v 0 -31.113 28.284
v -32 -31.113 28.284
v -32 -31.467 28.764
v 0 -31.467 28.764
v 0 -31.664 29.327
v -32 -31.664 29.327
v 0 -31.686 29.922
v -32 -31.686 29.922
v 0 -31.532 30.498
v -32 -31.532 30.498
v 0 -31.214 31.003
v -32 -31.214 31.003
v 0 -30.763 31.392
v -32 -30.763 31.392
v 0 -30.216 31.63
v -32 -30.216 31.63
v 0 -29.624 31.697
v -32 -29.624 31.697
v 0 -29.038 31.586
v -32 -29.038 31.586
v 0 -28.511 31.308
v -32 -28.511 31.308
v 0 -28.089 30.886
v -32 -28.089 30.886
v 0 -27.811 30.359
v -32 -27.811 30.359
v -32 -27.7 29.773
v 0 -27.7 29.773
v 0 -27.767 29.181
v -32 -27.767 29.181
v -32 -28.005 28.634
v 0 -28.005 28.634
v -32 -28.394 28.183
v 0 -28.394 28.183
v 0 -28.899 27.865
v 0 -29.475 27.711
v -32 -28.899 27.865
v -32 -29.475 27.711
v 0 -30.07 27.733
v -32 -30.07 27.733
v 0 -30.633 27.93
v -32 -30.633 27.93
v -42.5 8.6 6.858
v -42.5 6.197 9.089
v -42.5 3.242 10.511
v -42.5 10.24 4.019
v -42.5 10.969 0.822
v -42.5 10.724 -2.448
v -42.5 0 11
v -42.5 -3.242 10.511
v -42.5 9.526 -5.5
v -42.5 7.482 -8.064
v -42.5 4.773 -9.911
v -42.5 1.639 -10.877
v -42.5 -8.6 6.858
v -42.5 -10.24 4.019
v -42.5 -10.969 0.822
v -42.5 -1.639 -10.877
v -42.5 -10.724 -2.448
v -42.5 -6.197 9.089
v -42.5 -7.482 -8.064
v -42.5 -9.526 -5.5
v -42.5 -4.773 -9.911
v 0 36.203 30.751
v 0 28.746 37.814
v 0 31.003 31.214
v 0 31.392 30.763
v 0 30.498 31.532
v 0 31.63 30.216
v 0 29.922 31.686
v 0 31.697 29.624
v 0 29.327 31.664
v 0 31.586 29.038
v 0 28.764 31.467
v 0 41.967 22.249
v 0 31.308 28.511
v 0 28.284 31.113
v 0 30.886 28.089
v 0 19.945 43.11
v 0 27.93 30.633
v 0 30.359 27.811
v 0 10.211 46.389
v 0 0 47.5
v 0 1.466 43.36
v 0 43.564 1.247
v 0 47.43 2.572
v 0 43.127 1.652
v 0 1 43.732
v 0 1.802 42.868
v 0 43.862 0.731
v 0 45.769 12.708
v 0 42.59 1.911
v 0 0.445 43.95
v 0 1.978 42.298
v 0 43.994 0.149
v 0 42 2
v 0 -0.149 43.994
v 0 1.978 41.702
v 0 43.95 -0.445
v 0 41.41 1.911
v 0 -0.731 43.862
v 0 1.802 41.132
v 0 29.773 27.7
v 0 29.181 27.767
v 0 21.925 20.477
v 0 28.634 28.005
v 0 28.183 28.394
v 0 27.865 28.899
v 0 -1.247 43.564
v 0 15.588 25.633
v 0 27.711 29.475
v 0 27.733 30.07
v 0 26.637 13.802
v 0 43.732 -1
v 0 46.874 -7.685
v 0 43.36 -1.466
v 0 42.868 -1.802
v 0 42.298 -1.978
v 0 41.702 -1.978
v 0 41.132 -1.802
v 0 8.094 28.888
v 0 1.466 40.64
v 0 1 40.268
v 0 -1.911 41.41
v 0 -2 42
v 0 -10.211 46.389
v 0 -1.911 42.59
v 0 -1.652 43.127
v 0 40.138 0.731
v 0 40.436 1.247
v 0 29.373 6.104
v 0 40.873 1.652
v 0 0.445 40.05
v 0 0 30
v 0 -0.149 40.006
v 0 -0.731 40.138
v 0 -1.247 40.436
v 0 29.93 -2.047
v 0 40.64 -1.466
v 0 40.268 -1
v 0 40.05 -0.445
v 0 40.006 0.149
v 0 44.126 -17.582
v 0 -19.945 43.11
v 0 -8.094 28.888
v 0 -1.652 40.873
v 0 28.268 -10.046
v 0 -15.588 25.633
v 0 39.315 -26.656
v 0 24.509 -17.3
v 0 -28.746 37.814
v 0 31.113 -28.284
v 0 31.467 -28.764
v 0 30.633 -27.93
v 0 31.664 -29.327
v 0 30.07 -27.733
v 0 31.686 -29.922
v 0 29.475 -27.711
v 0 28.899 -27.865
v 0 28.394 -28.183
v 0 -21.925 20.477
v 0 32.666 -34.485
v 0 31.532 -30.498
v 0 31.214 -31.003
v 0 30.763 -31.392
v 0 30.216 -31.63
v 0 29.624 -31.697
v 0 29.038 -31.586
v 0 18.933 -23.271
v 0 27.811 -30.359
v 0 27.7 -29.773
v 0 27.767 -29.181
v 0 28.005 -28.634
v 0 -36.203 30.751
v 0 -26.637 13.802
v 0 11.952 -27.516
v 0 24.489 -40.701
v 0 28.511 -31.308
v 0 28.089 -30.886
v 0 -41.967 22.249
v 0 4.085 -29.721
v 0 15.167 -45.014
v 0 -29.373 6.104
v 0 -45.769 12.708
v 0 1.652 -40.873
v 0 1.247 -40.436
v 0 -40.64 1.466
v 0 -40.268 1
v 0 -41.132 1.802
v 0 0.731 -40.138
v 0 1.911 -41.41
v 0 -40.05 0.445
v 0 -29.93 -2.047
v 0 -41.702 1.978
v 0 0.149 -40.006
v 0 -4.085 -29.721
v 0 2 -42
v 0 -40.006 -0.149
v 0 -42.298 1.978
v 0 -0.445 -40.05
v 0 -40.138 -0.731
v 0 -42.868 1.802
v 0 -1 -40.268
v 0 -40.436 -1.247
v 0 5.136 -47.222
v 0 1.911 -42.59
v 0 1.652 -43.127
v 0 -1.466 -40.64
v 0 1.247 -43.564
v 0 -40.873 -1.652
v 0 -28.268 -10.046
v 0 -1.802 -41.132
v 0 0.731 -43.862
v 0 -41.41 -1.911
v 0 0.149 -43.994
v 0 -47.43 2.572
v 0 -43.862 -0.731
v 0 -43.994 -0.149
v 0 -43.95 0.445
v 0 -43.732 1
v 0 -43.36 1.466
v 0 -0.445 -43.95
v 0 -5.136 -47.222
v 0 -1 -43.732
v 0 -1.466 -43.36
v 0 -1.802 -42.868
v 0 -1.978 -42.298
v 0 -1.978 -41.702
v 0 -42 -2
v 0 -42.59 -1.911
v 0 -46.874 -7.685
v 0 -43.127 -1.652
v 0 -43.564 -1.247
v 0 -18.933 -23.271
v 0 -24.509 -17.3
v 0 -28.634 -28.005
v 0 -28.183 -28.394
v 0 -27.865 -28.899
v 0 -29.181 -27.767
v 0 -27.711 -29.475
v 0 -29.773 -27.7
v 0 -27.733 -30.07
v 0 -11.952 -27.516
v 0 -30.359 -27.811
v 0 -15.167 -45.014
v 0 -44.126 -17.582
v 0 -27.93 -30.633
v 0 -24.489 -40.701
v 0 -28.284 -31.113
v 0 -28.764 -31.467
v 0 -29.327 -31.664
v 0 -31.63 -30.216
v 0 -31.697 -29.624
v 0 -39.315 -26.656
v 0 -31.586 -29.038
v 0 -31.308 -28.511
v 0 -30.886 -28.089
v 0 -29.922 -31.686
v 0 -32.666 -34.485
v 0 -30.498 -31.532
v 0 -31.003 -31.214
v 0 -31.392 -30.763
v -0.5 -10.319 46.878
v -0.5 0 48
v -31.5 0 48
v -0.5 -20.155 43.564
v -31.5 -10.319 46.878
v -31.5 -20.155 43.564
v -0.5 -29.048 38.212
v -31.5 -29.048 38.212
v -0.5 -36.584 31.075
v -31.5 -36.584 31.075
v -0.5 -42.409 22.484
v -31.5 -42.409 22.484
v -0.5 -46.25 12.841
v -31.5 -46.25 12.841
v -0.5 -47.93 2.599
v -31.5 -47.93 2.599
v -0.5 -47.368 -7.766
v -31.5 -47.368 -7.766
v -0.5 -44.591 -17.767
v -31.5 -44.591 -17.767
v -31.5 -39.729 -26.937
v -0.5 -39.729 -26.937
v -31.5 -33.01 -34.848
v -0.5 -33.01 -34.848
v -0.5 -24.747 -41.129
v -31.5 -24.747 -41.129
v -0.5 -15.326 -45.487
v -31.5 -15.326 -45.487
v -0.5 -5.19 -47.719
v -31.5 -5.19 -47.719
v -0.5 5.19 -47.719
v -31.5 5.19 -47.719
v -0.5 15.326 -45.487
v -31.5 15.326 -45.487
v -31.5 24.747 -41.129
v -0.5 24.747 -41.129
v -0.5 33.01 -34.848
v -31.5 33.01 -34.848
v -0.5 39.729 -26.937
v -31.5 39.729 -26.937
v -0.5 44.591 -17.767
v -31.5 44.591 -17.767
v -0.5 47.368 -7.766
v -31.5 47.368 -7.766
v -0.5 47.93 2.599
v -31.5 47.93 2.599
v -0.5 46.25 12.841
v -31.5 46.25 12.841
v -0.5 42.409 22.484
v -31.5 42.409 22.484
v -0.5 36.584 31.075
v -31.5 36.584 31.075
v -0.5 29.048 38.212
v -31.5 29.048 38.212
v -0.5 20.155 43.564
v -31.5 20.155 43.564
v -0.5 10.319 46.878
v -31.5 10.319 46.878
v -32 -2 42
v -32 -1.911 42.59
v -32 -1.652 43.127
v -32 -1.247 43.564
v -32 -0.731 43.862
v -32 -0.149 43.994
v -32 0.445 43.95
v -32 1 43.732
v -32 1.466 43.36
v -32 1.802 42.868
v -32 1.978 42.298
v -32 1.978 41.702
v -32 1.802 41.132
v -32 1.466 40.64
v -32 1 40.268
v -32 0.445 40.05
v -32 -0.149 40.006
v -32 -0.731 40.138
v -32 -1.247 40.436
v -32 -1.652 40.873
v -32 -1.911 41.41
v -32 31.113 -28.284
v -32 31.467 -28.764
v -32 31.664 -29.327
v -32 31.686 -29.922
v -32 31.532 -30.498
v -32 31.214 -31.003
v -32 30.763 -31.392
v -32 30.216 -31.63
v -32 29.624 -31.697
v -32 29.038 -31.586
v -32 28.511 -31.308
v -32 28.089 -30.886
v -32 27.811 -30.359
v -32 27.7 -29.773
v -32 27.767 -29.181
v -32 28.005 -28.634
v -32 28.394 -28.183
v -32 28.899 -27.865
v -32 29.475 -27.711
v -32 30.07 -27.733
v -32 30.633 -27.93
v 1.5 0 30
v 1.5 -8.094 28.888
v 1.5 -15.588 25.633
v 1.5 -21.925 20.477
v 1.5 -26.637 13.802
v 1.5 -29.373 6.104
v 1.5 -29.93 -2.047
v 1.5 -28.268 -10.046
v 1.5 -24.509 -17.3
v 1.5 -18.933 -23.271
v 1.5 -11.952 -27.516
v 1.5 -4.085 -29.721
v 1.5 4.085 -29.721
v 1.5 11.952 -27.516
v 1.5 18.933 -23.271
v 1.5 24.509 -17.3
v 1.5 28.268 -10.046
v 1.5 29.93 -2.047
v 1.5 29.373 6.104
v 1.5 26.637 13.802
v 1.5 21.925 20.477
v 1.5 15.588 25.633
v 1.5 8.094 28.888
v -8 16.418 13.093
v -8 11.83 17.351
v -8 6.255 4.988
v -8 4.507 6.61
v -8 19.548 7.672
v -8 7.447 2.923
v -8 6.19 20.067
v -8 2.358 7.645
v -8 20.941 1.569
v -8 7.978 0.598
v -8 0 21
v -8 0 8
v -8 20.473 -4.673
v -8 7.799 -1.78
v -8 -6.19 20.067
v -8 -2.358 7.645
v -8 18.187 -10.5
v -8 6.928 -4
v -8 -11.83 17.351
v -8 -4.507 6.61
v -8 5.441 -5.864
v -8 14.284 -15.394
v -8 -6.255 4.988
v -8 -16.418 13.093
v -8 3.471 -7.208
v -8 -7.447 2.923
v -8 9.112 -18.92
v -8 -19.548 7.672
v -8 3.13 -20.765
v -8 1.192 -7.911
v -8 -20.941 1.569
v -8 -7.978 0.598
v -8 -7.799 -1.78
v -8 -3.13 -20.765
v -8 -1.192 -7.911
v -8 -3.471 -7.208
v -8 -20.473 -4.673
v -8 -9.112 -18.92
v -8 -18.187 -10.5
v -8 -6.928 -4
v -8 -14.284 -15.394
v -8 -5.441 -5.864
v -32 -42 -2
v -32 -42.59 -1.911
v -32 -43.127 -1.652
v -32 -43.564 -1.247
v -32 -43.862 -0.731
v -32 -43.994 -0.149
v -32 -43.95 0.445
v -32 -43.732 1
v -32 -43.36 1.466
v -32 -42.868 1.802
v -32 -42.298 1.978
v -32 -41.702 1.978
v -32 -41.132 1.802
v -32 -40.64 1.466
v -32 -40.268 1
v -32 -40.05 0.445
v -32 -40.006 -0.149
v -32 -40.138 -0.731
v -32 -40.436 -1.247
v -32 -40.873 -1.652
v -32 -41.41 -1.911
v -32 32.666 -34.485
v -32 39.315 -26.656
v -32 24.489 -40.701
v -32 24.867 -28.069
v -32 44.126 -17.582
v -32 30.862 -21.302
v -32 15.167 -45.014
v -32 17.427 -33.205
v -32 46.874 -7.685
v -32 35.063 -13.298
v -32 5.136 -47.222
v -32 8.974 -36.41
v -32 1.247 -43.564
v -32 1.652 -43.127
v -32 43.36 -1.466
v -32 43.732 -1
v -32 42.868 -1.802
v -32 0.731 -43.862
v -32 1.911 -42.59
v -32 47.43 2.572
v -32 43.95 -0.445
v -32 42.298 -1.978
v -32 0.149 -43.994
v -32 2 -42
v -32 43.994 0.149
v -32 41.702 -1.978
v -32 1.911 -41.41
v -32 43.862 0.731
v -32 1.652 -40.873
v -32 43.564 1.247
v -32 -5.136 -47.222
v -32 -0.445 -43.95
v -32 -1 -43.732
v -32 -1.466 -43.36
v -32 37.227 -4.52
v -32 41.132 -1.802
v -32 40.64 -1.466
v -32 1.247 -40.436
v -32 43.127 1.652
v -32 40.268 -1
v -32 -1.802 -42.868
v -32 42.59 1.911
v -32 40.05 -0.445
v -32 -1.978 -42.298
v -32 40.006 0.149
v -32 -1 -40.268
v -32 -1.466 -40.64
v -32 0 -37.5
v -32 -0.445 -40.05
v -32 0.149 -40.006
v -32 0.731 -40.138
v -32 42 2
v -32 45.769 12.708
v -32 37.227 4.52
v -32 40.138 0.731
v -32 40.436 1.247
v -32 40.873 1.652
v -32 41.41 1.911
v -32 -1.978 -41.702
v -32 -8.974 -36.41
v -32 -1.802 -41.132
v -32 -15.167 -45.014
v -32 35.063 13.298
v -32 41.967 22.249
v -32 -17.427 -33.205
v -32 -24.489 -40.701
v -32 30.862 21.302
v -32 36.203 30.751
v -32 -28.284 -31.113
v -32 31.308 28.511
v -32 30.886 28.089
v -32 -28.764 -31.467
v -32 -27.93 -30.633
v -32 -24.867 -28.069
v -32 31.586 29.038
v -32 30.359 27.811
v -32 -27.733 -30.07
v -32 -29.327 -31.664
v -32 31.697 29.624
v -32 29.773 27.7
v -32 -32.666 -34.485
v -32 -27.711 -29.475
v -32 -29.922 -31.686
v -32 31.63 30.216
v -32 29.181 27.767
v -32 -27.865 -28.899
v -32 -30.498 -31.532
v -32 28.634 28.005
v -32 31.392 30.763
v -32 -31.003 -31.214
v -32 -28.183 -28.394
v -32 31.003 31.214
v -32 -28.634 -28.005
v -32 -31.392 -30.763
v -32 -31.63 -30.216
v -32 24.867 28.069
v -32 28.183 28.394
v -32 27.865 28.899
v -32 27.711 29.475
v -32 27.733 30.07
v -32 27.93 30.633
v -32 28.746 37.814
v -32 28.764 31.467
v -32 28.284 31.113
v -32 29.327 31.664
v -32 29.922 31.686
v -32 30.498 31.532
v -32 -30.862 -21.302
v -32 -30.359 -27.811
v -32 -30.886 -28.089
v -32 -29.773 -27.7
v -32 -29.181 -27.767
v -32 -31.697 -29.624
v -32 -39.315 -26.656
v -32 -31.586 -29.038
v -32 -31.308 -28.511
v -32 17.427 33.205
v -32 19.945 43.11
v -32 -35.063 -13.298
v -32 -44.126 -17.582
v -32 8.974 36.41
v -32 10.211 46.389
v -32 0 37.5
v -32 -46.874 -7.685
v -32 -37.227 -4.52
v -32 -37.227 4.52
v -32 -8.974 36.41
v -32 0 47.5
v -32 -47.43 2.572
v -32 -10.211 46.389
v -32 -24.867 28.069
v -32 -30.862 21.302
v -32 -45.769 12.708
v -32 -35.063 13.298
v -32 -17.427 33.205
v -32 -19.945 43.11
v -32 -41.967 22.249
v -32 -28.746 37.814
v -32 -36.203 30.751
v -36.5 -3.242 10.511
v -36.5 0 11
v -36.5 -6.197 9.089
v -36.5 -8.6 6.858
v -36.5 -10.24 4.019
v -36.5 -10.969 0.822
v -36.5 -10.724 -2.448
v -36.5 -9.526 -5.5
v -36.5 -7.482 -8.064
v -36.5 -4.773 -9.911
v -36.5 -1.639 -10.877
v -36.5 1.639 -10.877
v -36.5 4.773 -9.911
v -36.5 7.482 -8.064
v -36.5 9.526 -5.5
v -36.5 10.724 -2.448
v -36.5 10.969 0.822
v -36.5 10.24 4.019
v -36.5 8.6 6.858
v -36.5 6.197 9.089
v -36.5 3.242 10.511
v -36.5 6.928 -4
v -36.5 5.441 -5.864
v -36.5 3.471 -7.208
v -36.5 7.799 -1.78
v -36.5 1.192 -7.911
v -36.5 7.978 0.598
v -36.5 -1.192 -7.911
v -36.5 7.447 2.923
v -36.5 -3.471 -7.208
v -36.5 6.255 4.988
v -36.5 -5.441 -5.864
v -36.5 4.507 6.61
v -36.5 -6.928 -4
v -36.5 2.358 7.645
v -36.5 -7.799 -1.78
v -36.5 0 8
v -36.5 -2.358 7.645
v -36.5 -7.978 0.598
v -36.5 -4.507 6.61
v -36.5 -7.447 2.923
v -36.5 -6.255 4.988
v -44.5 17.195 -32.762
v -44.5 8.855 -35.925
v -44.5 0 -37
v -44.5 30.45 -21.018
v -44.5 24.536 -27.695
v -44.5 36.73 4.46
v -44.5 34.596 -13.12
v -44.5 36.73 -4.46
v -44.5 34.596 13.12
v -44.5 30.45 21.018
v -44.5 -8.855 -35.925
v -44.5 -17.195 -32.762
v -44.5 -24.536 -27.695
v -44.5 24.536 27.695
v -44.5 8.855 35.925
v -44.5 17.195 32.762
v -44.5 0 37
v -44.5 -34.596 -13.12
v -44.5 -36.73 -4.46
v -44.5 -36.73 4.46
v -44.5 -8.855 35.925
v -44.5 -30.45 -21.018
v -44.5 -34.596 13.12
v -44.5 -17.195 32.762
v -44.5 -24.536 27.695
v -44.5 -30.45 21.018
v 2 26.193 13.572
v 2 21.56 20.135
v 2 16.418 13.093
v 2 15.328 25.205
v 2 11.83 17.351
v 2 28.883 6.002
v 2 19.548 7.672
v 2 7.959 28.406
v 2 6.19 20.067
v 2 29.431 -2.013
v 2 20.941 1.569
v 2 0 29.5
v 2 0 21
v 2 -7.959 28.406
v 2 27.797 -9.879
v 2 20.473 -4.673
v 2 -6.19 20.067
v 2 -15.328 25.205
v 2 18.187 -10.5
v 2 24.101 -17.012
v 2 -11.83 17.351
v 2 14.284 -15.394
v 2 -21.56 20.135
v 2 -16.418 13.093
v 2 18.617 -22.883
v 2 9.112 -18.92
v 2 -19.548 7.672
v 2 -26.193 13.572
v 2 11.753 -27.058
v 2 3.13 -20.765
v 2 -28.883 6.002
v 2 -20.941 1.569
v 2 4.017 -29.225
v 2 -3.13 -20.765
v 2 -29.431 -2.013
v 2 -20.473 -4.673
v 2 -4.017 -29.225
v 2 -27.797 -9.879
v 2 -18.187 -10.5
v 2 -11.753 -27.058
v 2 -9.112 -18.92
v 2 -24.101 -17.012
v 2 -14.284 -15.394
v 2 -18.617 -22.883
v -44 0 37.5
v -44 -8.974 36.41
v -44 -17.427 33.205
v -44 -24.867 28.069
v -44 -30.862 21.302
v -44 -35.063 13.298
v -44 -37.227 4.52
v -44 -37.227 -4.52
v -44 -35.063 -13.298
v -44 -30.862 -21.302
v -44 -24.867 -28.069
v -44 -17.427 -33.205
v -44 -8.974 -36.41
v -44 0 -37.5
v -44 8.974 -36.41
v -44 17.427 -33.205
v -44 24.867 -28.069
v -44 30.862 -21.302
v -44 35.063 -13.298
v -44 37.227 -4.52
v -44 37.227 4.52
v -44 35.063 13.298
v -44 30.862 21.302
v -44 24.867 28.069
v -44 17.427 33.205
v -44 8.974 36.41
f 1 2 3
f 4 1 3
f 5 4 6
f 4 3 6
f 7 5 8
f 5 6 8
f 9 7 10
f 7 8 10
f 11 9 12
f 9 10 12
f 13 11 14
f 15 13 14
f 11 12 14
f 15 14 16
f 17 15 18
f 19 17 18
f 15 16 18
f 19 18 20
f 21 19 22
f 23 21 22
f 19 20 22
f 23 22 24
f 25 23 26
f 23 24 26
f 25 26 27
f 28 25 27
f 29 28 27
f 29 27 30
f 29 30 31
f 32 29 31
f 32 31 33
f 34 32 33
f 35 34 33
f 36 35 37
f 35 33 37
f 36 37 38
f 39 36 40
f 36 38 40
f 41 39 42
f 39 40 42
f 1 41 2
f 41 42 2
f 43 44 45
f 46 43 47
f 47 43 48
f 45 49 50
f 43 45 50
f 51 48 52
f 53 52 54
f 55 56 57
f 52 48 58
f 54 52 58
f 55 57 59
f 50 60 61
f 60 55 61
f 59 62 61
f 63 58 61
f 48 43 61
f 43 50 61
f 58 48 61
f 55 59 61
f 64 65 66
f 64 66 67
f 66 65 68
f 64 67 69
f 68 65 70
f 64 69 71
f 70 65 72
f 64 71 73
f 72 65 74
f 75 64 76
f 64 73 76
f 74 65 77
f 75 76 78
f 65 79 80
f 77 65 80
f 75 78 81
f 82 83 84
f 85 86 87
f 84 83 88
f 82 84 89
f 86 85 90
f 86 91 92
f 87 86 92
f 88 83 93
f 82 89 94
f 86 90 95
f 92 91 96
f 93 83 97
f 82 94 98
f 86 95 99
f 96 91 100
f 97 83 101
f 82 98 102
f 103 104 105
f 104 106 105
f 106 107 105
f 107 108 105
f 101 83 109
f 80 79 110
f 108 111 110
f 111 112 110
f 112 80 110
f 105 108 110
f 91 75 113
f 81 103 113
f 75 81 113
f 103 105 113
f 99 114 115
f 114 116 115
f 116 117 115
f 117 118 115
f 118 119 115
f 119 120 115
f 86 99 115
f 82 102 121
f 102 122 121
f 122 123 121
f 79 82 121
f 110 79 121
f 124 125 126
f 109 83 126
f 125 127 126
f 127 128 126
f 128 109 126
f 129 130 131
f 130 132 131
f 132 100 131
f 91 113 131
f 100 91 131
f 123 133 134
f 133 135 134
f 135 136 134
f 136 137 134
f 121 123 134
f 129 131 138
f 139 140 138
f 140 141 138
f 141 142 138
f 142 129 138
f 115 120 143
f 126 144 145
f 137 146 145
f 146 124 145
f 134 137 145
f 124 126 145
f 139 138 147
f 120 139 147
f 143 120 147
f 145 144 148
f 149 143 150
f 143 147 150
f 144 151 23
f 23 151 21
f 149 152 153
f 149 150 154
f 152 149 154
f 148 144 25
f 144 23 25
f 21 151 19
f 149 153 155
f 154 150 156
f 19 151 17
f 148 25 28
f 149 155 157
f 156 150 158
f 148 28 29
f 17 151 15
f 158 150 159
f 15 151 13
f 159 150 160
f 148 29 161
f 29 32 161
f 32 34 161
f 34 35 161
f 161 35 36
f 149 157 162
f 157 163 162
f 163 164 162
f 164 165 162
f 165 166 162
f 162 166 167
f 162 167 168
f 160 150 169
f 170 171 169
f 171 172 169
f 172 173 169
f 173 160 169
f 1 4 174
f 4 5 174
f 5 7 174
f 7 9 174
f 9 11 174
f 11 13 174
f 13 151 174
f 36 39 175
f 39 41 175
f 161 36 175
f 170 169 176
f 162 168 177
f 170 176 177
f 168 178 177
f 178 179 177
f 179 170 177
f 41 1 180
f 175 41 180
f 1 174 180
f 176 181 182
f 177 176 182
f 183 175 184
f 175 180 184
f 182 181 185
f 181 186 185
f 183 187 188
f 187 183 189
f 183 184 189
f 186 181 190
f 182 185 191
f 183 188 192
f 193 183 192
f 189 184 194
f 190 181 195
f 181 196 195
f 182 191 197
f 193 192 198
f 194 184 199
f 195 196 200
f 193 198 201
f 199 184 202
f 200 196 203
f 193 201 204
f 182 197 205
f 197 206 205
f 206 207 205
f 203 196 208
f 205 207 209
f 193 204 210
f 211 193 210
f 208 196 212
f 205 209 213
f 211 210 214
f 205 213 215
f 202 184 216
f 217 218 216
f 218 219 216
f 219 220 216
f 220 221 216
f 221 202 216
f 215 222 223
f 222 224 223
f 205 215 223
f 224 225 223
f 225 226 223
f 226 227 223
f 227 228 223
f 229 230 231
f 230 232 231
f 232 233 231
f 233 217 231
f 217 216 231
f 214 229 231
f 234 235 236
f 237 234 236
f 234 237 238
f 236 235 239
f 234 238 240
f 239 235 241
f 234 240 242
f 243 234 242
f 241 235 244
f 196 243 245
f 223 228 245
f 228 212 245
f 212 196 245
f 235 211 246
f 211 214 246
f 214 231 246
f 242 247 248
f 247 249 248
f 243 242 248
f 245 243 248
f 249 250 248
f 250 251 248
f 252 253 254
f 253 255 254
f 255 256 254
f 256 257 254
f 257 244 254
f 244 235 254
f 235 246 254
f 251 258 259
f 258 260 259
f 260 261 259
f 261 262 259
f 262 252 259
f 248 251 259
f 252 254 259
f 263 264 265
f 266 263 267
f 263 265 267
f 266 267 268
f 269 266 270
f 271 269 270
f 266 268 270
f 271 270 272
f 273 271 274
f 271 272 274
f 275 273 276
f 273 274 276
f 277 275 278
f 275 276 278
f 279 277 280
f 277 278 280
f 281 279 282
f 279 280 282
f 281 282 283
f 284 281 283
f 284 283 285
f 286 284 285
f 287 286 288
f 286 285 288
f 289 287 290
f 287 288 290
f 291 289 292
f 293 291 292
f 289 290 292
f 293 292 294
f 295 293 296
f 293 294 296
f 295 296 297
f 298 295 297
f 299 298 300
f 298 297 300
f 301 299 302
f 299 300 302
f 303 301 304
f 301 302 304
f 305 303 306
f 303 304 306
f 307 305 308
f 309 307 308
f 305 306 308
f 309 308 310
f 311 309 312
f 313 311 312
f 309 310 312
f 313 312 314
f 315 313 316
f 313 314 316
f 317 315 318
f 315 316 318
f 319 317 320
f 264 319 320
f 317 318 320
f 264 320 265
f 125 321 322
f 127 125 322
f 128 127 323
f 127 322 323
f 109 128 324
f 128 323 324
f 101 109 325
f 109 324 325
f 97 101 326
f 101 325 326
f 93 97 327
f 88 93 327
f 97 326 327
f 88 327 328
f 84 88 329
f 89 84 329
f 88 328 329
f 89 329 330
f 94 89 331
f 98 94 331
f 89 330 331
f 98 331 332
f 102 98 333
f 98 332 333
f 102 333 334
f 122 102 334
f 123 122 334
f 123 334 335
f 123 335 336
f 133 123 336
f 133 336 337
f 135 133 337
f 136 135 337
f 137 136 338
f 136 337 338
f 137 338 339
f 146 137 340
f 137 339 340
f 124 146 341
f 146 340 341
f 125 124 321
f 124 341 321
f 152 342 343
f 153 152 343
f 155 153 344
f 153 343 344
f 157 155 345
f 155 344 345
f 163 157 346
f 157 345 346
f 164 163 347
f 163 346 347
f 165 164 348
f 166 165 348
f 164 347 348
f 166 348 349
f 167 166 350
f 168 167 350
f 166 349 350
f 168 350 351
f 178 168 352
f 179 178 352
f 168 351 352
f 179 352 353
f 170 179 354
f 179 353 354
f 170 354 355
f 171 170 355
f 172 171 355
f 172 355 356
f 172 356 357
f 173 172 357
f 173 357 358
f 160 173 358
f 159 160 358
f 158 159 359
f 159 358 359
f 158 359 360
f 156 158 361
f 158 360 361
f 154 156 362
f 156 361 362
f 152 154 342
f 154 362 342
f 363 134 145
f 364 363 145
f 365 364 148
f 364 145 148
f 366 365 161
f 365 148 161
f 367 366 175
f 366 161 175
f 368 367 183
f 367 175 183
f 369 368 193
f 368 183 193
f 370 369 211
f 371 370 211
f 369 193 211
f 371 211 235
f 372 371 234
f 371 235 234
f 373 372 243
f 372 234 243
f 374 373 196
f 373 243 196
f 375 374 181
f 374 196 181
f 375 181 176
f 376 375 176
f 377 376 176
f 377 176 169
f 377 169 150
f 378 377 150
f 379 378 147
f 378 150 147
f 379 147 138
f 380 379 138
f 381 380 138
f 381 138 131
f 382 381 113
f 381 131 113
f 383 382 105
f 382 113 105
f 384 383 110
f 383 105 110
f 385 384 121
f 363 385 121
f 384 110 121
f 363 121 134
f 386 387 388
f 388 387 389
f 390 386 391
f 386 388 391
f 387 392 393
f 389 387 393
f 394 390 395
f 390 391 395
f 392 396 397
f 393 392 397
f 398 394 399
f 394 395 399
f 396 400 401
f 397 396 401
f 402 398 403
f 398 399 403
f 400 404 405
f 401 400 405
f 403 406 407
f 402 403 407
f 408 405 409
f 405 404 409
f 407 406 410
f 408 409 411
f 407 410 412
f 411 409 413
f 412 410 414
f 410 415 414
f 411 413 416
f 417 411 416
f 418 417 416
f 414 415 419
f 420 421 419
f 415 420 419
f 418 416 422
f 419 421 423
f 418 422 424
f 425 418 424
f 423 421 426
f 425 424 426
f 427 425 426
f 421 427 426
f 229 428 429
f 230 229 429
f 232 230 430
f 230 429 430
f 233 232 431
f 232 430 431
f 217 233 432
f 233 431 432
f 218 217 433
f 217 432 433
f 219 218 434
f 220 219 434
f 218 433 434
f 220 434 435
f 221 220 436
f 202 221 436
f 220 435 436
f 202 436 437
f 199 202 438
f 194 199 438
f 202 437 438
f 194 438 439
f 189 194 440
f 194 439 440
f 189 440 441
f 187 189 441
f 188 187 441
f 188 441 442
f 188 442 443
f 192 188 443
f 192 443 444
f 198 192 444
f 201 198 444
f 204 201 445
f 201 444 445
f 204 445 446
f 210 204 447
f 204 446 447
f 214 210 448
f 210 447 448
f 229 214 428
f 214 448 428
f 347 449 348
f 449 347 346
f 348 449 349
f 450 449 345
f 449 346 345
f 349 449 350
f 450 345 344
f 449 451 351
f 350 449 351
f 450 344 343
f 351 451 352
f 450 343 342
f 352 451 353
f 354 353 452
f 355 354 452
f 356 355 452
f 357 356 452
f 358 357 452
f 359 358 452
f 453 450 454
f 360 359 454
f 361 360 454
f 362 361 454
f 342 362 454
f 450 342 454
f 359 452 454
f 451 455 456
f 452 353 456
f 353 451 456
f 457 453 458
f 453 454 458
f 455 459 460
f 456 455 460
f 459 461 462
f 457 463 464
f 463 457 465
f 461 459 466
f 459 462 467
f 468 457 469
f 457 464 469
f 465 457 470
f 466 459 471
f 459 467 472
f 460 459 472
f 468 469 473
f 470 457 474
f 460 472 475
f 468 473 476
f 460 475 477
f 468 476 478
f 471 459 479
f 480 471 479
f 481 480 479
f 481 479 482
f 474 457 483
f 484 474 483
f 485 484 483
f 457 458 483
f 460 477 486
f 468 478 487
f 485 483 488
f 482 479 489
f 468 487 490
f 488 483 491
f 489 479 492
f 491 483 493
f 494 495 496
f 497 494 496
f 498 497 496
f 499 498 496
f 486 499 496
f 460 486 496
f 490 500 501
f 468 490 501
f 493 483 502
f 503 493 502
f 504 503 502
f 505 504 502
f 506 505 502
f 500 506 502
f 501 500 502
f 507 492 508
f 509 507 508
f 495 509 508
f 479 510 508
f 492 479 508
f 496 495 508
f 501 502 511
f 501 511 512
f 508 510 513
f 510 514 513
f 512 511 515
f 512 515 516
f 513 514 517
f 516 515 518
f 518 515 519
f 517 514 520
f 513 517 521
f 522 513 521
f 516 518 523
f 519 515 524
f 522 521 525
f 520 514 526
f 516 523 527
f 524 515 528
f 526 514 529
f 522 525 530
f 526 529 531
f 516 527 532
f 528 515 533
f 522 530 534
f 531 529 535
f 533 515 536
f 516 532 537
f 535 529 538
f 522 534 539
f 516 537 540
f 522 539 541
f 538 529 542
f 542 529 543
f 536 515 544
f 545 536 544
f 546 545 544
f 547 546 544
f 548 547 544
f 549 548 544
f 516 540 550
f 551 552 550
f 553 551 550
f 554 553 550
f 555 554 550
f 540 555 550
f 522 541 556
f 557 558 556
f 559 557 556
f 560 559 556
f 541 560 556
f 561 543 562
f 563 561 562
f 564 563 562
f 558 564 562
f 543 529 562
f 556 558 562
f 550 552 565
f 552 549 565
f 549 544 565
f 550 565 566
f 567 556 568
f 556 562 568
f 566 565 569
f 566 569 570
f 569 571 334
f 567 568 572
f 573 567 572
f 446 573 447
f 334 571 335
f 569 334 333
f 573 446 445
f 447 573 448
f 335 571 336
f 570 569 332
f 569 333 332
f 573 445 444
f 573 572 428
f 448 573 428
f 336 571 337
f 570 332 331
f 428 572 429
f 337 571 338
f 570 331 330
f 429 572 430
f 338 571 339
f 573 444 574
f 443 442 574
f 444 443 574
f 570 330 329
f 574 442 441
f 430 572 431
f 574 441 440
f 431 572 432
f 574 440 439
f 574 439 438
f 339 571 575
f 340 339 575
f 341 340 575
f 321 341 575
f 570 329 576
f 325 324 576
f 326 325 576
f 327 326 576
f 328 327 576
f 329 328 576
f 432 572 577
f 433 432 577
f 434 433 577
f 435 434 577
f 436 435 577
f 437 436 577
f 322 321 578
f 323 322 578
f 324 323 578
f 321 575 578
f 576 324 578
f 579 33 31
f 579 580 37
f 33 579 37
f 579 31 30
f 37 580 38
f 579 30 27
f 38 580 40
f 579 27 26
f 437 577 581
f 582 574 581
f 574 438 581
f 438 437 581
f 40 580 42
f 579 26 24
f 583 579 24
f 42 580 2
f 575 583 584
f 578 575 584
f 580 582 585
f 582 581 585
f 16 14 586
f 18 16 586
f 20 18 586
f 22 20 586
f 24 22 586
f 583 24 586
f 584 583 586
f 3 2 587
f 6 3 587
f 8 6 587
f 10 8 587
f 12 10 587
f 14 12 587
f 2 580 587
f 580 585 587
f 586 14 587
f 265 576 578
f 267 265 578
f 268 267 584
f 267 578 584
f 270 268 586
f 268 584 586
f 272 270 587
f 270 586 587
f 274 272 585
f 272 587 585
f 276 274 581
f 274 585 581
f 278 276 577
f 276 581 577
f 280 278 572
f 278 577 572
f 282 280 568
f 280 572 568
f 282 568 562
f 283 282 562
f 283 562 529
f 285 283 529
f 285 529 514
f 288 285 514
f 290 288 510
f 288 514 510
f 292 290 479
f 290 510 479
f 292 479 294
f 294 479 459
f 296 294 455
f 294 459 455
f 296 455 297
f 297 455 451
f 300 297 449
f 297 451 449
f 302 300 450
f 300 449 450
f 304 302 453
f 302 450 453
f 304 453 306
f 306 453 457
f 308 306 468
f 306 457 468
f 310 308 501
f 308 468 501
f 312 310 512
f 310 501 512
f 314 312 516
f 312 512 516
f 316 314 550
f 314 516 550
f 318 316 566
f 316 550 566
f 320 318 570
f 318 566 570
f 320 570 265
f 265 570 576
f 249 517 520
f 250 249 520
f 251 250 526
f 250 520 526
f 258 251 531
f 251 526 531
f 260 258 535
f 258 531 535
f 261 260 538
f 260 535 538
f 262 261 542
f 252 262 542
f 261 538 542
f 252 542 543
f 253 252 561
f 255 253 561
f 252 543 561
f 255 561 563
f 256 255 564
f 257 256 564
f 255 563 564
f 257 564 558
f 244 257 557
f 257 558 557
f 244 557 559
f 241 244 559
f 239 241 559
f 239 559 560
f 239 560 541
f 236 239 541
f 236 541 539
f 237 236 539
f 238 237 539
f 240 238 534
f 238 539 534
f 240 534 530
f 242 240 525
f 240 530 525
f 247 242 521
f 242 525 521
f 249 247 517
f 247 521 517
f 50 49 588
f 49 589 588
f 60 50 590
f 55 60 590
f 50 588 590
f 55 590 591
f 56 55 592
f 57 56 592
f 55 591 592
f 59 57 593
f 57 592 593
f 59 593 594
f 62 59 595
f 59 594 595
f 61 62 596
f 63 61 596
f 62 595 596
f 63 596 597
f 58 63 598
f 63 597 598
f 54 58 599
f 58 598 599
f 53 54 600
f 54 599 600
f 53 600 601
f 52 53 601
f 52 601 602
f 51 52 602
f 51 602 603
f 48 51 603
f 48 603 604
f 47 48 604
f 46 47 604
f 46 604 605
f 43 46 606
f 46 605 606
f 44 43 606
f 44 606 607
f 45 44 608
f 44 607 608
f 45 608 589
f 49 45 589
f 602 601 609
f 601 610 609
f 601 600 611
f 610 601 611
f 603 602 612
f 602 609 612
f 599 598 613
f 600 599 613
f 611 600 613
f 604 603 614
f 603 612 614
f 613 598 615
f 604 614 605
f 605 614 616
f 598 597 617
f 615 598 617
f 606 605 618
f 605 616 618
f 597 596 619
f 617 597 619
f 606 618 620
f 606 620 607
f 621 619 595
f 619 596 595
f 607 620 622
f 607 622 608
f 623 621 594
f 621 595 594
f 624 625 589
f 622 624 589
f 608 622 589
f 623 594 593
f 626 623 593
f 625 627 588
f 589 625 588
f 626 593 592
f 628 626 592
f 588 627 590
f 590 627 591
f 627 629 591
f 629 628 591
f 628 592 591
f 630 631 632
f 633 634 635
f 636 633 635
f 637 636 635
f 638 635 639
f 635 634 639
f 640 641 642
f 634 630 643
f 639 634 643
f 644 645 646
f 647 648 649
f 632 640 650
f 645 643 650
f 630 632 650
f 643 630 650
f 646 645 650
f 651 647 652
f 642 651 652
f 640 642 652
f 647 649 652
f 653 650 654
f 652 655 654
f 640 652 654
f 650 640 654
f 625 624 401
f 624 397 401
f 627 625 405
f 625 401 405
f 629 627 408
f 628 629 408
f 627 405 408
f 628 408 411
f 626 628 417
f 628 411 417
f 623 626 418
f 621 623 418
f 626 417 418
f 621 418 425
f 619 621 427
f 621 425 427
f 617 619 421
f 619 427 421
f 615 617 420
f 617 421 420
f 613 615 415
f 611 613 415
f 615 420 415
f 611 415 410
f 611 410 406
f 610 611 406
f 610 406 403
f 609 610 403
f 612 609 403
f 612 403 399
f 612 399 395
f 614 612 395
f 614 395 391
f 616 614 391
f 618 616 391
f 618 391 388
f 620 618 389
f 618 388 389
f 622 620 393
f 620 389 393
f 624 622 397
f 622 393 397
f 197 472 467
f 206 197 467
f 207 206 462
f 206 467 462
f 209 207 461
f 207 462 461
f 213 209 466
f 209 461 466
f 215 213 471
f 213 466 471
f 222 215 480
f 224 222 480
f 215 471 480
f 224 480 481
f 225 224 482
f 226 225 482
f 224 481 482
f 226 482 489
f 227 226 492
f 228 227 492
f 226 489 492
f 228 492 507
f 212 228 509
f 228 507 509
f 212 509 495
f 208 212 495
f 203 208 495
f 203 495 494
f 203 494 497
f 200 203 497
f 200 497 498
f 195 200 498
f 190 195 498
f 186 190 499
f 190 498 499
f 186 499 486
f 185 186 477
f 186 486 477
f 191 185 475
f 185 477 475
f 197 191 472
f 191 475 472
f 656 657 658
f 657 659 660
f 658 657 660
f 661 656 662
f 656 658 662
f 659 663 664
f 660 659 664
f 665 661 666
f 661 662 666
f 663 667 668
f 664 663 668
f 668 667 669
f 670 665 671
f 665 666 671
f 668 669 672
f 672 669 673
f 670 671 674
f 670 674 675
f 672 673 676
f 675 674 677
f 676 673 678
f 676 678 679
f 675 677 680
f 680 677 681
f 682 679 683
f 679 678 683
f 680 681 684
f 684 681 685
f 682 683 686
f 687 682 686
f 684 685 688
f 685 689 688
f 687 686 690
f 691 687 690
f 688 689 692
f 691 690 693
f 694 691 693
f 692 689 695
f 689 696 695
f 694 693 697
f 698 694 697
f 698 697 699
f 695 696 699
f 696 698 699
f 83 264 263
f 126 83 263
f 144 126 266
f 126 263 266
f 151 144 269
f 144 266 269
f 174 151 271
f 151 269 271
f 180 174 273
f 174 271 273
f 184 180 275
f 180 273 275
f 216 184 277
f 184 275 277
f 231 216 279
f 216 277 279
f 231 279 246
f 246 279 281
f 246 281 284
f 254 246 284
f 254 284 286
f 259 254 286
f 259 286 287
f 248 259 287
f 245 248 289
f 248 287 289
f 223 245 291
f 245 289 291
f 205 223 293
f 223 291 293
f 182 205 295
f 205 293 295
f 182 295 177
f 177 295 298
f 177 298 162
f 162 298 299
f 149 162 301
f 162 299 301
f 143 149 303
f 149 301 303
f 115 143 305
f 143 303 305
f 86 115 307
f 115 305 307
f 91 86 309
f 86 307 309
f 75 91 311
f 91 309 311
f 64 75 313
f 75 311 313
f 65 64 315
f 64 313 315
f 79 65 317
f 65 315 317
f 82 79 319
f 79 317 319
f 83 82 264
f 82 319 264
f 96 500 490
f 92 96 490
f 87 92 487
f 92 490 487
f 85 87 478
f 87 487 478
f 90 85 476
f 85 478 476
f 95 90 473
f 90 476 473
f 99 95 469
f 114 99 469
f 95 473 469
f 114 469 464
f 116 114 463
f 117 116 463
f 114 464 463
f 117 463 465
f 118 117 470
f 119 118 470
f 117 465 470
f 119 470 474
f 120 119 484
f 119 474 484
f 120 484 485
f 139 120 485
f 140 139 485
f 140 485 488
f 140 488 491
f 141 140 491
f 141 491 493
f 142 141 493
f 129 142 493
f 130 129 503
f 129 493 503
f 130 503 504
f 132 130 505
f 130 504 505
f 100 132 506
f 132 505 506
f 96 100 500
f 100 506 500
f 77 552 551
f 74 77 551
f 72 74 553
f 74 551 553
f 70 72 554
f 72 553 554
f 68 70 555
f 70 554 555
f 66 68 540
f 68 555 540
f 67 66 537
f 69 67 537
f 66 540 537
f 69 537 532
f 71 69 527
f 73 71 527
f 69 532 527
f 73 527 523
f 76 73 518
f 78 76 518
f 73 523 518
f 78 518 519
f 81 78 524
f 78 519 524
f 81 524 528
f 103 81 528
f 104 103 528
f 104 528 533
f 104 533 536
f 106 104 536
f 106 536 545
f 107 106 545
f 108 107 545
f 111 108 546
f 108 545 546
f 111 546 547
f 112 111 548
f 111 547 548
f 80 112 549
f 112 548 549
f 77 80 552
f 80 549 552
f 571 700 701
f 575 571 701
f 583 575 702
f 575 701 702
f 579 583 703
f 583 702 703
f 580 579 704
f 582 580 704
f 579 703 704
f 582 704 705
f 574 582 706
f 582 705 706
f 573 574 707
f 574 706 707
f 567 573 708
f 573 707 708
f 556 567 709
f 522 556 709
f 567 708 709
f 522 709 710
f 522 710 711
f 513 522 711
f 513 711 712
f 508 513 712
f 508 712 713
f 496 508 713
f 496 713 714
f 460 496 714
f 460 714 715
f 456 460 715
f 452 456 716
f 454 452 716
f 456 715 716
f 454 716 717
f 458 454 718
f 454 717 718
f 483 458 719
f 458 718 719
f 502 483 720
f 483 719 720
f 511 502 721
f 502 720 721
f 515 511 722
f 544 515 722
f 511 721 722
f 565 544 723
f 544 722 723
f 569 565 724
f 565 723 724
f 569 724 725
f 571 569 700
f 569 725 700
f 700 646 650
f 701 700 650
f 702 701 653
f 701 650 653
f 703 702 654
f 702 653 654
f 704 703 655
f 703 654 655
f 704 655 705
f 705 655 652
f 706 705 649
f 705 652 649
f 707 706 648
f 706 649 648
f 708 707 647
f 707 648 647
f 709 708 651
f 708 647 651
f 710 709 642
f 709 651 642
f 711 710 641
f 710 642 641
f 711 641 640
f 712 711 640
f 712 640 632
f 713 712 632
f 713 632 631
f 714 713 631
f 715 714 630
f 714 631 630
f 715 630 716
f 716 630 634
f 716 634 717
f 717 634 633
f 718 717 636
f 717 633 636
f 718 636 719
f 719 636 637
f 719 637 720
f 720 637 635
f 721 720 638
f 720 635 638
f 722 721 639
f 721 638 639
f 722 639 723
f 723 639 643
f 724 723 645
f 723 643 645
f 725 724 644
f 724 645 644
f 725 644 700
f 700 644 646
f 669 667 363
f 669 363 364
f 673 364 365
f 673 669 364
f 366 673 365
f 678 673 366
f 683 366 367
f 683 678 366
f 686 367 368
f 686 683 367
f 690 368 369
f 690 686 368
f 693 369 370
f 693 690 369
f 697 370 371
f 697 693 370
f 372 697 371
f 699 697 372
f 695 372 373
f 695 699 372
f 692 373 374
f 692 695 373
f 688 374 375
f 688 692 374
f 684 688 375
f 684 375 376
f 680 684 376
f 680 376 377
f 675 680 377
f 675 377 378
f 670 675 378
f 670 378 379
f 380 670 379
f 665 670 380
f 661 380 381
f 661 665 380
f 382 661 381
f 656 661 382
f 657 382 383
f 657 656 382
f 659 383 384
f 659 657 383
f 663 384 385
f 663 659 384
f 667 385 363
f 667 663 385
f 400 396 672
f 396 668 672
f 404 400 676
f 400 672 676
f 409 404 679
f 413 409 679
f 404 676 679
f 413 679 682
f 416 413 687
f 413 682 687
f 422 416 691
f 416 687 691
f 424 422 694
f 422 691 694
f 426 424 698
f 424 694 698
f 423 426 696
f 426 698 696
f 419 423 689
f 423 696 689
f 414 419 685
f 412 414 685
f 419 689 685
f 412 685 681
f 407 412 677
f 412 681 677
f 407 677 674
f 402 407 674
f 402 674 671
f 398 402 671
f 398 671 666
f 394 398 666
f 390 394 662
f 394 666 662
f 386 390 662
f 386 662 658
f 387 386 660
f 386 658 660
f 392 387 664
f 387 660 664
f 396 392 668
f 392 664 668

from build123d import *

# Parameters (mm, degrees)
SKETCH3_R          = 2
CUT_EXTRUDE1_DEPTH = 32
CIRPATTERN1_COUNT  = 8
CHAMFER1_SIZE      = 0.5
CHAMFER2_SIZE      = 0.5


with BuildPart() as part:
    # Sketch2 → Revolve1 (revolve)
    with BuildSketch(Plane(origin=(0, 0, 0), x_dir=(1, 0, 0), z_dir=(0, 1, 0)), mode=Mode.PRIVATE) as revolve1_sk:
        Polygon((0, 30), (0, 48), (-32, 48), (-32, 37.5), (-44.5, 37.5), (-44.5, 0), (-42.5, 0), (-42.5, 11), (-36.5, 11), (-36.5, 8), (-8, 8), (-8, 21), (2, 21), (2, 30), align=None)
    revolve(revolve1_sk.sketch.rotate(Axis((-32, 0, 0), (1, 0, 0)), 180), axis=Axis((-32, 0, 0), (1, 0, 0)))

    # Sketch3 → Cut-Extrude1 (cut)
    with BuildSketch(Plane.ZY.offset(32)):
        with Locations((0, 42)):
            Circle(SKETCH3_R)
    cut_extrude1 = extrude(amount=-CUT_EXTRUDE1_DEPTH, mode=Mode.SUBTRACT)

    # CirPattern1: Cut-Extrude1 ×8 about axis
    cirpattern1_axis = Axis((0, 0, 0), (1, 0, 0))
    for i in range(1, CIRPATTERN1_COUNT):
        add(cut_extrude1.rotate(cirpattern1_axis, i * 360 / CIRPATTERN1_COUNT), mode=Mode.SUBTRACT)

    # Chamfer1
    chamfer1_edges = [part.edges().sort_by_distance(p)[0] for p in [
        (-44.5, 0, -37.5),
        (-32, 0, -48),
        (0, 0, -48),
    ]]
    chamfer(chamfer1_edges, length=CHAMFER1_SIZE)

    # Chamfer2
    chamfer2_edges = [part.edges().sort_by_distance(p)[0] for p in [
        (2, 0, -30),
    ]]
    chamfer(chamfer2_edges, length=CHAMFER2_SIZE)


solid = part.part
